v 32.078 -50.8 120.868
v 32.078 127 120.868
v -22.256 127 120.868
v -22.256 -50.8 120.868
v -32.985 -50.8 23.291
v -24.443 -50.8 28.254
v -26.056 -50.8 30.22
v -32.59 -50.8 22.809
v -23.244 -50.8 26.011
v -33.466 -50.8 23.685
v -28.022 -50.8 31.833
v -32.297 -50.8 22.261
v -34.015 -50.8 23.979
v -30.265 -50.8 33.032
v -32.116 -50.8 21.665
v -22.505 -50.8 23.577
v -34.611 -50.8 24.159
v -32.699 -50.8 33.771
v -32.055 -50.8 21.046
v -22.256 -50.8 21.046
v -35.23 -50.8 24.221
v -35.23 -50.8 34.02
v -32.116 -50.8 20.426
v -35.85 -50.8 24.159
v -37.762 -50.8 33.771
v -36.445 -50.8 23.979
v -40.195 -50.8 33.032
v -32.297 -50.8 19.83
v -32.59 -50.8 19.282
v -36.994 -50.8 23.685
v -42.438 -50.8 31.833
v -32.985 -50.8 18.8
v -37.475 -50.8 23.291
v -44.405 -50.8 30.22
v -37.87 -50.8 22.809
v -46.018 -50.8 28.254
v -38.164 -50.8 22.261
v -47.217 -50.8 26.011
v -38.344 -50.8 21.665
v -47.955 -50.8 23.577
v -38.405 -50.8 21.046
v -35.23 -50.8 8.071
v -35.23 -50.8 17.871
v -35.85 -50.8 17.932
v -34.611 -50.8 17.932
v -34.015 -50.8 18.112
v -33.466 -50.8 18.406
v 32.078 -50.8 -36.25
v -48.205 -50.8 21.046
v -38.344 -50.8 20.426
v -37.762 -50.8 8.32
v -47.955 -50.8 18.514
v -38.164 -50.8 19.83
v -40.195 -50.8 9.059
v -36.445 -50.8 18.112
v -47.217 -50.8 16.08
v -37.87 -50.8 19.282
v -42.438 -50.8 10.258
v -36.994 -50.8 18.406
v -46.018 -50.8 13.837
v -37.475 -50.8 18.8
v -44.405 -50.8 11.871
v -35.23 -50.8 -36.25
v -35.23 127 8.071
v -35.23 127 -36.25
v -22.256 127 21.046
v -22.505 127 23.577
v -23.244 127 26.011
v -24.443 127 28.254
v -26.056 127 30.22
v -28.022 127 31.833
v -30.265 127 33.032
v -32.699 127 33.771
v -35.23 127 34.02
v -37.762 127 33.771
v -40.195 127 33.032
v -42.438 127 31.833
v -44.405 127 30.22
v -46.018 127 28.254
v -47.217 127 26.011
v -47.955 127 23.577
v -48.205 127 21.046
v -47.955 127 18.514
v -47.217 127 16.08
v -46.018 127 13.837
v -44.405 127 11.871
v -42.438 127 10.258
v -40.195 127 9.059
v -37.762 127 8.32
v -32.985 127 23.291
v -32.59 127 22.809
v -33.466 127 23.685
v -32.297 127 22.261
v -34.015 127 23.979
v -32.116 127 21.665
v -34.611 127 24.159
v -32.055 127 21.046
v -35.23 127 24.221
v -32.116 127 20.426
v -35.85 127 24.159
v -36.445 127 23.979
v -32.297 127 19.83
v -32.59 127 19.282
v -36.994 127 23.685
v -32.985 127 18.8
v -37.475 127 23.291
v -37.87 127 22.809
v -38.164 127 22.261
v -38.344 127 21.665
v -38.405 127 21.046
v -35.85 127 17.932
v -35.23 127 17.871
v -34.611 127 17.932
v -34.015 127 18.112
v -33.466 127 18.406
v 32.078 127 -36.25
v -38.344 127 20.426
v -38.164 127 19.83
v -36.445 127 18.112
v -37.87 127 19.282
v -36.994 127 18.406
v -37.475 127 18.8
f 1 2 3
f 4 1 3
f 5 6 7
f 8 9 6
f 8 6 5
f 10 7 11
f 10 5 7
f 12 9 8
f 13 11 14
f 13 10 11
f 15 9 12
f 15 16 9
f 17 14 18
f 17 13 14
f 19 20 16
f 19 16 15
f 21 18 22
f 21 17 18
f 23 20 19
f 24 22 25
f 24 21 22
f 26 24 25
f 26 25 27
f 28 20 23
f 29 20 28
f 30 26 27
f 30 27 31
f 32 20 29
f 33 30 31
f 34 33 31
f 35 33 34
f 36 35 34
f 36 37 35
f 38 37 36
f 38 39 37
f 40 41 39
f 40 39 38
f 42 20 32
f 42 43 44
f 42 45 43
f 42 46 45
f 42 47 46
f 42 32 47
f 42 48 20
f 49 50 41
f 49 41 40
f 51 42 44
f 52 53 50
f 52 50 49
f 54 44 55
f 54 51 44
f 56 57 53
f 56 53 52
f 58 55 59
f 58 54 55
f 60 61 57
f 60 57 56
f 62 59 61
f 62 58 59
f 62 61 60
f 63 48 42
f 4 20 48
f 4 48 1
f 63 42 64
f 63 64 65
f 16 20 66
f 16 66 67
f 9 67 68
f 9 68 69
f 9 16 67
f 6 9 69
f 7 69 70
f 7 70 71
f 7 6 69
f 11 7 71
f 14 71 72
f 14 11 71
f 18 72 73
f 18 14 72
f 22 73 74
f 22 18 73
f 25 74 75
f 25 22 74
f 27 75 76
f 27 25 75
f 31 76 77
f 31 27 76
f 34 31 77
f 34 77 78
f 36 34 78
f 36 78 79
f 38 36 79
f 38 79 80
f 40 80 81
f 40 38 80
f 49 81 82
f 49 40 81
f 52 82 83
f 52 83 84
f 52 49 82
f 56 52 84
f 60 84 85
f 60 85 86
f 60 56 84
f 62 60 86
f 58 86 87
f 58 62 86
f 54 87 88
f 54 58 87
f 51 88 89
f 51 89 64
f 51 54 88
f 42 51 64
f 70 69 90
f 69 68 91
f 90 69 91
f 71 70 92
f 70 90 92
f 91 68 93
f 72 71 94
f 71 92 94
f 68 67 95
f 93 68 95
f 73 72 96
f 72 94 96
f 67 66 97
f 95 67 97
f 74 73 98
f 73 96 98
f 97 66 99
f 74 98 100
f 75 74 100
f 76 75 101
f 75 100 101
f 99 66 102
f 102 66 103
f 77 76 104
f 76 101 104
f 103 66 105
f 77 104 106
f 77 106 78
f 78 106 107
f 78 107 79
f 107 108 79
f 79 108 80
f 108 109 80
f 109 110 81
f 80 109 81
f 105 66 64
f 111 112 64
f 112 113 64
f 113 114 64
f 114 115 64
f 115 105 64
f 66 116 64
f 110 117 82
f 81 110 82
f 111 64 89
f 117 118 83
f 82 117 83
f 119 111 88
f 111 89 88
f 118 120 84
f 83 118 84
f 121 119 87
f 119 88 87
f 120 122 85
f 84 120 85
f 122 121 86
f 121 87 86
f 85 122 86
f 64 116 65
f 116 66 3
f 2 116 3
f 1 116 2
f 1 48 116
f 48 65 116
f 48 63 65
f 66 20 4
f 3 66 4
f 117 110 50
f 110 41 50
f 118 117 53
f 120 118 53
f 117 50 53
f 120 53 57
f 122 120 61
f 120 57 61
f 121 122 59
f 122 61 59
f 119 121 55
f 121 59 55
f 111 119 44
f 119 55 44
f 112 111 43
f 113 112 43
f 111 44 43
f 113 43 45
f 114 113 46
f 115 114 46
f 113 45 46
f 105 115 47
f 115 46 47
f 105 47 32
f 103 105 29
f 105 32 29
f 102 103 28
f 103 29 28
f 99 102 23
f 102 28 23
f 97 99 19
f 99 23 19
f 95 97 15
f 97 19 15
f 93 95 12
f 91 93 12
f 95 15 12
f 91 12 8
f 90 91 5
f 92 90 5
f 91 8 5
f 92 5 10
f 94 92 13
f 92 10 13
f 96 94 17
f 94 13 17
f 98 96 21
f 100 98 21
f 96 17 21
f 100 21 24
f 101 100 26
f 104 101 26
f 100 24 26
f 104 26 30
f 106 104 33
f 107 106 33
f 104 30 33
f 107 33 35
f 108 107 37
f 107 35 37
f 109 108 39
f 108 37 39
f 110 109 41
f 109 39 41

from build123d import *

# Parameters (mm, degrees)
F1_DEPTH      = 25.4
F2_DEPTH      = 25.4
F3_DEPTH      = 99.822
F3_DEPTH_BACK = 25.4
F4_D          = 6.35
F5_DEPTH      = 127


# Not quite as in the source:
# - a feature names something its author has since deleted; it is built from what else it names


with BuildPart() as f1:
    # F0 (on Front) → F1 (new body)
    with BuildSketch(Plane.XZ):
        with BuildLine():
            Line((32.0781692863, 21.0455041379), (-22.2560535658, 21.0455041379))
            ThreePointArc((-22.2560535658, 21.0455041379), (-26.0561402101, 11.8712834228), (-35.2303609252, 8.0711967784))
            Line((-35.2303609252, 8.0711967784), (-35.2303609252, -36.2501852214))
            Line((-35.2303609252, -36.2501852214), (32.0781692863, -36.2501852214))
            Line((32.0781692863, -36.2501852214), (32.0781692863, 21.0455041379))
        make_face()
        with BuildLine():
            Line((-22.2560535658, 21.0455041379), (-35.2303609252, 21.0455041379))
            Line((-35.2303609252, 21.0455041379), (-35.2303609252, 8.0711967784))
            ThreePointArc((-35.2303609252, 8.0711967784), (-26.0561402101, 11.8712834228), (-22.2560535658, 21.0455041379))
        make_face()
        with BuildLine():
            Line((-35.2303609252, 8.0711967784), (-35.2303609252, 21.0455041379))
            Line((-35.2303609252, 21.0455041379), (-22.2560535658, 21.0455041379))
            ThreePointArc((-22.2560535658, 21.0455041379), (-44.4045816403, 30.2197248529), (-35.2303609252, 8.0711967784))
        make_face()
    extrude(amount=F1_DEPTH)

    # F2 (add): a face of the model
    f2_faces = [f1.faces().sort_by_distance(p)[0] for p in [
        (-4.8856962064, -25.4, -4.7596143665),
    ]]
    extrude(f2_faces, amount=F2_DEPTH)

    # F3 (add, two sides): a face of the model
    f3_faces = [f1.faces().sort_by_distance(p)[0] for p in [
        (4.9110578602, -25.4, 21.0455041379),
    ]]
    extrude(f3_faces, amount=F3_DEPTH)
    extrude(f3_faces, amount=-F3_DEPTH_BACK)

    # F4 (through all)
    with Locations(Plane(origin=(0, 0, 0), x_dir=(1, 0, 0), z_dir=(0, 1, 0))):
        with Locations((-35.2303609252, -21.0455041379)):
            Hole(F4_D / 2)

    # F5 (add): a face of the model
    f5_faces = [f1.faces().sort_by_distance(p)[0] for p in [
        (0.7229147363, 0, 37.7328540078),
    ]]
    extrude(f5_faces, amount=F5_DEPTH)


solid = f1.part
